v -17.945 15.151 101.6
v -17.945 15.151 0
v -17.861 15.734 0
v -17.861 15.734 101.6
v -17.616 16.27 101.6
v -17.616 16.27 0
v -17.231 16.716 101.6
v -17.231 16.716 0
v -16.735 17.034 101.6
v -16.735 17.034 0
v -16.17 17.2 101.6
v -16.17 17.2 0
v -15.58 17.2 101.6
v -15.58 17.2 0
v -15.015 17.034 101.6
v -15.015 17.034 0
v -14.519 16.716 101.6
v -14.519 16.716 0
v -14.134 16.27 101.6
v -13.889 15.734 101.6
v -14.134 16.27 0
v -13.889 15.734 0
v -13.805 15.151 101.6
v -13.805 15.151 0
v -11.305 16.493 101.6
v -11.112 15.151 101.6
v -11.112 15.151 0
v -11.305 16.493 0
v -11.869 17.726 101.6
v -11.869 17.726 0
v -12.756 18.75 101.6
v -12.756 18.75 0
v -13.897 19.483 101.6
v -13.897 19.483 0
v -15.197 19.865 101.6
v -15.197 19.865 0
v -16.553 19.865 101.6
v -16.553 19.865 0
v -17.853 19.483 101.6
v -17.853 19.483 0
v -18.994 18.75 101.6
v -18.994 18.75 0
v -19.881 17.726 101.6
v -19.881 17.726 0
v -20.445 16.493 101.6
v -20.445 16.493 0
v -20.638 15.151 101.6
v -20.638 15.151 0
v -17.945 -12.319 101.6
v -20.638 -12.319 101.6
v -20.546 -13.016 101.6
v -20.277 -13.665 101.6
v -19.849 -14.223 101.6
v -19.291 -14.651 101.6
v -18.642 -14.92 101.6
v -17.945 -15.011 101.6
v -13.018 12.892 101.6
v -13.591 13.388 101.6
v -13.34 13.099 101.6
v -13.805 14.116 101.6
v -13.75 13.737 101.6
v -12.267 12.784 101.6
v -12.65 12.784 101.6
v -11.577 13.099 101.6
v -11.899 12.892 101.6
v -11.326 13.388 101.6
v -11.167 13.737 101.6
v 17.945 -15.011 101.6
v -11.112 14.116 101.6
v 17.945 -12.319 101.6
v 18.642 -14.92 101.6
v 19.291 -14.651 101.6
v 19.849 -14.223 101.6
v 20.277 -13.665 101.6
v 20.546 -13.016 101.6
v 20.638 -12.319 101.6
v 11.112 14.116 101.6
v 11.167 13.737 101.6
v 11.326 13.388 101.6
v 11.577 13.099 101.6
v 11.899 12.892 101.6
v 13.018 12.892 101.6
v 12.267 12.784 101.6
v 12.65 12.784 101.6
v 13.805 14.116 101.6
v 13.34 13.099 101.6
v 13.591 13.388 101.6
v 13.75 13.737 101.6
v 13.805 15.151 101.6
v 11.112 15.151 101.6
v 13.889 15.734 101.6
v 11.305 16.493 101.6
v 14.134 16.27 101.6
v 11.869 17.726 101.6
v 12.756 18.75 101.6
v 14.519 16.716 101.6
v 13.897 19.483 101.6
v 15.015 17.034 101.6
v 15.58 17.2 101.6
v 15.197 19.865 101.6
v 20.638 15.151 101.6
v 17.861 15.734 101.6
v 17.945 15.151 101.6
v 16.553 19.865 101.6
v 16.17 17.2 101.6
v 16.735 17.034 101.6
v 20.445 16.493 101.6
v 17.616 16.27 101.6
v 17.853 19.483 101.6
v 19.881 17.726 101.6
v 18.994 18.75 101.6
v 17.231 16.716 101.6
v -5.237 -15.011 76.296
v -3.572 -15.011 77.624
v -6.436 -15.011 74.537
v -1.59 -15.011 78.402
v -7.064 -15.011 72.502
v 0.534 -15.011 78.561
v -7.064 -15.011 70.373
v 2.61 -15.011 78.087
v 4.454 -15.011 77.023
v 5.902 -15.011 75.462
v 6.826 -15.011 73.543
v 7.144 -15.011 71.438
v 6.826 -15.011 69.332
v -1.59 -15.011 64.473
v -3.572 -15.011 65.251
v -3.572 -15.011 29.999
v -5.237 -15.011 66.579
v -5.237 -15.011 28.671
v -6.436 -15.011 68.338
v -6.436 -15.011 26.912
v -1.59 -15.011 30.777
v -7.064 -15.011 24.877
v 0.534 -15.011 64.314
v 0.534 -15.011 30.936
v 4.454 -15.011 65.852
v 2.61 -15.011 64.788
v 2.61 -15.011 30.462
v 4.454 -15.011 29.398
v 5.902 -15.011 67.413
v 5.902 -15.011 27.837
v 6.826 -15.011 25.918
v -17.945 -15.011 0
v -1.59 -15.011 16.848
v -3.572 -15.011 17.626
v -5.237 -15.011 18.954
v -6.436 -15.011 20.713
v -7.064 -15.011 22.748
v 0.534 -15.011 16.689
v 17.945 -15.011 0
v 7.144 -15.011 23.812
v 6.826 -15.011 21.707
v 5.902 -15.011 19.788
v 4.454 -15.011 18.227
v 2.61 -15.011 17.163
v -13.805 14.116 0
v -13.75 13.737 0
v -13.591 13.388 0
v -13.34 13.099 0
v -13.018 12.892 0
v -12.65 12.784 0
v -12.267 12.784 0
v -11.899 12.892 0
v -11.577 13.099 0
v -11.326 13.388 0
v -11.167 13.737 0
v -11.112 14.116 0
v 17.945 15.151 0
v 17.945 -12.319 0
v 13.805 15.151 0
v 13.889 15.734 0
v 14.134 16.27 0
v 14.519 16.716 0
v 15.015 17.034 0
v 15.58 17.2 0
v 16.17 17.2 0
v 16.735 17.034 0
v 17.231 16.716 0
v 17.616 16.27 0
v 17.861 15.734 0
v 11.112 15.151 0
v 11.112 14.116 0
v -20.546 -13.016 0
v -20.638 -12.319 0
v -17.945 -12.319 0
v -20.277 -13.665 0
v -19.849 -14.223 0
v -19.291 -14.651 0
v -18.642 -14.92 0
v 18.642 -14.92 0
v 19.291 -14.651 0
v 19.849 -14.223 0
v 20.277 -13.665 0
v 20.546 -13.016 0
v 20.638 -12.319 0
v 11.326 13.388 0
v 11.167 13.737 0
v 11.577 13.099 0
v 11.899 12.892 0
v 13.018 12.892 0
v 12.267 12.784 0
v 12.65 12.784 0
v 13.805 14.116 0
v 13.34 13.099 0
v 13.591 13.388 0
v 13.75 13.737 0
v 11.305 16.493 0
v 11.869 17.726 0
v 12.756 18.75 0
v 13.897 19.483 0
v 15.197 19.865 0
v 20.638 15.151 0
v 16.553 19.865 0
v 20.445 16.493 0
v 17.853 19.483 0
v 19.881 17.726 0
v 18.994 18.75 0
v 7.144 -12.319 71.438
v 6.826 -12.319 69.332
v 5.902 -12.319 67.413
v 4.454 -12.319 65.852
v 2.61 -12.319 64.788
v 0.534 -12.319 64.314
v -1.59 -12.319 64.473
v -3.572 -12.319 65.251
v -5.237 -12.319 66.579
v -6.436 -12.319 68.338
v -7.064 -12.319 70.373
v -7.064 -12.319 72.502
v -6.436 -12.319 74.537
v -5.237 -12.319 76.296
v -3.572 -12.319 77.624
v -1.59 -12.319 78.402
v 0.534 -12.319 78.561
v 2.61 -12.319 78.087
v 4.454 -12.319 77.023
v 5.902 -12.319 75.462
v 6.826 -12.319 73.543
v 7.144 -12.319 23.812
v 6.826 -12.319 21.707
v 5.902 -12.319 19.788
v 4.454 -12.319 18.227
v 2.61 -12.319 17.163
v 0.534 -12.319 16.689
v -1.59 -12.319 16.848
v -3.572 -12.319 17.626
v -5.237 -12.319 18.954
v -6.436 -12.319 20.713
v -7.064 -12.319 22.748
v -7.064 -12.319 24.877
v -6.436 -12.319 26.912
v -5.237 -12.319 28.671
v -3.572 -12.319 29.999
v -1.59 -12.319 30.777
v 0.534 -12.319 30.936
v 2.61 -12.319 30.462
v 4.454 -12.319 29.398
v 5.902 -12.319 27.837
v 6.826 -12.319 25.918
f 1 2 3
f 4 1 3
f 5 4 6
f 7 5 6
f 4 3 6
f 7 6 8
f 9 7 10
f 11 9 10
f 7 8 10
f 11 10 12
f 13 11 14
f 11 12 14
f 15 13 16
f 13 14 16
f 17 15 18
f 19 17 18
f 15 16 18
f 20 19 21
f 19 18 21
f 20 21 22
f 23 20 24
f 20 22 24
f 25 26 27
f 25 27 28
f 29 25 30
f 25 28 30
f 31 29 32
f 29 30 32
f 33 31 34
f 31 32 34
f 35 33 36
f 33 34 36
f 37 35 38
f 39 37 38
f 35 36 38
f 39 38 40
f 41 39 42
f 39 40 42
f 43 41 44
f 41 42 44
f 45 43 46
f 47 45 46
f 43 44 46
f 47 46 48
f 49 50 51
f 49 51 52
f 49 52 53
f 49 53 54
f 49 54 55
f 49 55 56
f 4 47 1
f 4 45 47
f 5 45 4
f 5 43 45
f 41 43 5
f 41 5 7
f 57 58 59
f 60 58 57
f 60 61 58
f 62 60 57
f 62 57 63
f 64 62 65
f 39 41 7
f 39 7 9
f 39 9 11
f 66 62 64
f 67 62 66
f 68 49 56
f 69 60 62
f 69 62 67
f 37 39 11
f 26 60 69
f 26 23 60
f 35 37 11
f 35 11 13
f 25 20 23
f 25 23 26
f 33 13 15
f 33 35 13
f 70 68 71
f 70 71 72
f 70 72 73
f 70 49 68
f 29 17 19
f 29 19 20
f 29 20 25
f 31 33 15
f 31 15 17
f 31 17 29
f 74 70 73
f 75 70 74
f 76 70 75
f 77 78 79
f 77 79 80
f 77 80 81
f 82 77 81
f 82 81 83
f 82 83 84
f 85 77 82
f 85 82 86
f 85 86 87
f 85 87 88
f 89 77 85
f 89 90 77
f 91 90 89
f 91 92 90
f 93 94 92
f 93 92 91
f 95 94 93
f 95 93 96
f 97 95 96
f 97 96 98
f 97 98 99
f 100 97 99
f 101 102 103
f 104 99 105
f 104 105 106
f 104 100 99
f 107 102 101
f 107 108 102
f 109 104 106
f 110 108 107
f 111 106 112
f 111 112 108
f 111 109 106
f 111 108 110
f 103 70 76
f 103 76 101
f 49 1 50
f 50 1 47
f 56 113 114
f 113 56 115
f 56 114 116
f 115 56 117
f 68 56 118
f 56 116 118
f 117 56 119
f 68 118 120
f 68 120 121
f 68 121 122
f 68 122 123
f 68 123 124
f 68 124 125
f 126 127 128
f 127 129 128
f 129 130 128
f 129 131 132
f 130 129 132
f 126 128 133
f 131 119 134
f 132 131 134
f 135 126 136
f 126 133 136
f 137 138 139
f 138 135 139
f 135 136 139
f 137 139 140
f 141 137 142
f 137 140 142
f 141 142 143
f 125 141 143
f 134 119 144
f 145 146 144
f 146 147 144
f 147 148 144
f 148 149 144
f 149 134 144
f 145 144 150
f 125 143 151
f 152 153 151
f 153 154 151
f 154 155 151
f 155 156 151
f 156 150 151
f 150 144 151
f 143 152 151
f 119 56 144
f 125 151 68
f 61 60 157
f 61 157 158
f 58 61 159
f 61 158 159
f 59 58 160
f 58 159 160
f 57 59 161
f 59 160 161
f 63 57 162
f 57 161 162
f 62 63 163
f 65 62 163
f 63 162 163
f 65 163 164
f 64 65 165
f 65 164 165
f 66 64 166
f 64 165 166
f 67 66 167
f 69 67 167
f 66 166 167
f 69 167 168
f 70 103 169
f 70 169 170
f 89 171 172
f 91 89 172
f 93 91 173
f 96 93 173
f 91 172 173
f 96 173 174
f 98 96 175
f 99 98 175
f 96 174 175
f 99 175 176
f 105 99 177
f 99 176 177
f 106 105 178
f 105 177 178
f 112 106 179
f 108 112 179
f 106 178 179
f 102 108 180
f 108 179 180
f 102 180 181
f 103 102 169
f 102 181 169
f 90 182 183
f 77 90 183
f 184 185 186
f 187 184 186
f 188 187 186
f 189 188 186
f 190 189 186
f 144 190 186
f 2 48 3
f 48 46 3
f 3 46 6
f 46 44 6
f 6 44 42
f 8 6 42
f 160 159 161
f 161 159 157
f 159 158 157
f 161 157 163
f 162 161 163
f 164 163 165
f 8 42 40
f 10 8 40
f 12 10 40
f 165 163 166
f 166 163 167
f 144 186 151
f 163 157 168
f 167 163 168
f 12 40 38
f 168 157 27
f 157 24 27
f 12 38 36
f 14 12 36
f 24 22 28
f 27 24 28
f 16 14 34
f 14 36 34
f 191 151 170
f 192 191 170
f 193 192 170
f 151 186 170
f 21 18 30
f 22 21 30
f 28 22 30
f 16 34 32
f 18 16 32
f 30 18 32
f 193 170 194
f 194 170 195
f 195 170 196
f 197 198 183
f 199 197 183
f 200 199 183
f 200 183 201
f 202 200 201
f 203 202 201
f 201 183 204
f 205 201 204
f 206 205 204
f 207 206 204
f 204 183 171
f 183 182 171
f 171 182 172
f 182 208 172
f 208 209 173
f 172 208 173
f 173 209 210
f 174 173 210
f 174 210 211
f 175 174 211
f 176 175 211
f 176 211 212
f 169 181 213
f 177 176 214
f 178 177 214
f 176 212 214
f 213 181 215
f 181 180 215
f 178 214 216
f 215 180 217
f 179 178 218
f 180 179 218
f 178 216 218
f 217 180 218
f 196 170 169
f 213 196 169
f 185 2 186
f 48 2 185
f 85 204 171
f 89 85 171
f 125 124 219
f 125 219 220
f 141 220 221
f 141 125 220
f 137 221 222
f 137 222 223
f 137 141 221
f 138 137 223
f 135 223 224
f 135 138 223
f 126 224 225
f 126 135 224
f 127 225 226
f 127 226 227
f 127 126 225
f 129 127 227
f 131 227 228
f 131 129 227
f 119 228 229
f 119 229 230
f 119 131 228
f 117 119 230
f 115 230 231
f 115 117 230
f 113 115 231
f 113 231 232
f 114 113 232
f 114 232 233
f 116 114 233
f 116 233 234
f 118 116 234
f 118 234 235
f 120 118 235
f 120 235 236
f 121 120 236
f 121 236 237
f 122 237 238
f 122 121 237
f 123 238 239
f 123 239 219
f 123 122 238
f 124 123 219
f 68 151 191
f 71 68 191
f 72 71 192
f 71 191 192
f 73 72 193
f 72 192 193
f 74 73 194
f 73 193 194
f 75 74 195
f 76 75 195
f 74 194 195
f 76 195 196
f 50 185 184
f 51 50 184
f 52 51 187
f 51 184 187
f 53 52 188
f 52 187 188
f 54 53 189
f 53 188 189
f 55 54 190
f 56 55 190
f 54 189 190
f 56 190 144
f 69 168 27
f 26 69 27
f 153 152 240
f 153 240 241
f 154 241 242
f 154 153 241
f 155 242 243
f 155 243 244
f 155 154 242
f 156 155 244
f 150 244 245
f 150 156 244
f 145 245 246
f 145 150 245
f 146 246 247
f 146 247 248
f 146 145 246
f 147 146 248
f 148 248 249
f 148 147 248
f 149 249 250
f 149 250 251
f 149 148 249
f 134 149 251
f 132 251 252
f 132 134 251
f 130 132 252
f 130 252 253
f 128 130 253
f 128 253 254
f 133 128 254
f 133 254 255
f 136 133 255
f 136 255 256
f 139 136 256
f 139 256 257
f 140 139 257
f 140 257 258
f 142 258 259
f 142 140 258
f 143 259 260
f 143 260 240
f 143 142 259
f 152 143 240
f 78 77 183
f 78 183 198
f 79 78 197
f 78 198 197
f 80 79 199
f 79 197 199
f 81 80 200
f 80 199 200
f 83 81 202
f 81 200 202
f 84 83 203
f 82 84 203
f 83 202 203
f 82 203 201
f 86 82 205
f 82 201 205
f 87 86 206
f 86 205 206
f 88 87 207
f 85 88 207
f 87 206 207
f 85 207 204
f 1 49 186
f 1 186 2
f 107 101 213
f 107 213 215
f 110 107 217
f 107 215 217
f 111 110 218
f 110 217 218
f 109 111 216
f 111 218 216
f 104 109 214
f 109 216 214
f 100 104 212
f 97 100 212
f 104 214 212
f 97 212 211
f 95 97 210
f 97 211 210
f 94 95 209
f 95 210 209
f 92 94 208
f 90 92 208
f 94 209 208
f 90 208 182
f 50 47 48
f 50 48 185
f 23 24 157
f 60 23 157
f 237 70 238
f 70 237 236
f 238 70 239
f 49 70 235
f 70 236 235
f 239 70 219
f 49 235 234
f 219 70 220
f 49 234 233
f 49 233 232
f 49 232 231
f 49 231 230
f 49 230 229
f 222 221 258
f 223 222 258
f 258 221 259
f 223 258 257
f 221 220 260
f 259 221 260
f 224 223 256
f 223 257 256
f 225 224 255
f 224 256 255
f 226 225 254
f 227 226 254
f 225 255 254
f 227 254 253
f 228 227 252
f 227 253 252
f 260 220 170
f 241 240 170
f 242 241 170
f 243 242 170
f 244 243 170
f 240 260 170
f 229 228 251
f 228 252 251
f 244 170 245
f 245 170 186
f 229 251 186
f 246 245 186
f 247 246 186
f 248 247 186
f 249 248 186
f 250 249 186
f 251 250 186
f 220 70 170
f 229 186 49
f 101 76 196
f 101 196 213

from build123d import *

# Parameters (mm, degrees)
BASE_EXTRUDE_DEPTH = 101.6
HOLE1_START        = -15.0114
HOLE1_OUTLINE_R    = 7.14375
HOLE1_DEPTH        = 2.6924
LPATTERN2_COUNT    = 2
LPATTERN2_PITCH    = 47.625


# Read off the part's stored shape, not the designer's step: Hole1
with BuildPart() as part:
    # Sketch1 → Base-Extrude (new body)
    with BuildSketch(Plane.XY):
        with BuildLine():
            Line((-20.6375, 15.1511), (-20.6375, -12.319))
            ThreePointArc((-20.6375, -12.319), (-19.848914298, -14.222814298), (-17.9451, -15.0114))
            Line((-17.9451, -15.0114), (17.9451, -15.0114))
            ThreePointArc((17.9451, -15.0114), (19.848914298, -14.222814298), (20.6375, -12.319))
            Line((20.6375, -12.319), (20.6375, 15.1511))
            ThreePointArc((20.6375, 15.1511), (15.875, 19.9136), (11.1125, 15.1511))
            Line((11.1125, 15.1511), (11.1125, 14.11605))
            ThreePointArc((11.1125, 14.11605), (12.4587, 12.76985), (13.8049, 14.11605))
            Line((13.8049, 14.11605), (13.8049, 15.1511))
            ThreePointArc((13.8049, 15.1511), (15.875, 17.2212), (17.9451, 15.1511))
            Line((17.9451, 15.1511), (17.9451, -12.319))
            Line((17.9451, -12.319), (-17.9451, -12.319))
            Line((-17.9451, -12.319), (-17.9451, 15.1511))
            ThreePointArc((-17.9451, 15.1511), (-15.875, 17.2212), (-13.8049, 15.1511))
            Line((-13.8049, 15.1511), (-13.8049, 14.11605))
            ThreePointArc((-13.8049, 14.11605), (-12.4587, 12.76985), (-11.1125, 14.11605))
            Line((-11.1125, 14.11605), (-11.1125, 15.1511))
            ThreePointArc((-11.1125, 15.1511), (-15.875, 19.9136), (-20.6375, 15.1511))
        make_face()
    extrude(amount=BASE_EXTRUDE_DEPTH)

    # Hole1 outline → Hole1 (cut)
    with BuildSketch(Plane(origin=(0, 0, 0), x_dir=(1, 0, 0), z_dir=(0, 1, 0)).offset(HOLE1_START)):
        with Locations((0, -23.8125)):
            Circle(HOLE1_OUTLINE_R)
    hole1 = extrude(amount=HOLE1_DEPTH, mode=Mode.SUBTRACT)

    # LPattern2: Hole1 ×2
    with Locations(*[(0, 0, i * LPATTERN2_PITCH) for i in range(1, LPATTERN2_COUNT)]):
        add(hole1, mode=Mode.SUBTRACT)


solid = part.part
